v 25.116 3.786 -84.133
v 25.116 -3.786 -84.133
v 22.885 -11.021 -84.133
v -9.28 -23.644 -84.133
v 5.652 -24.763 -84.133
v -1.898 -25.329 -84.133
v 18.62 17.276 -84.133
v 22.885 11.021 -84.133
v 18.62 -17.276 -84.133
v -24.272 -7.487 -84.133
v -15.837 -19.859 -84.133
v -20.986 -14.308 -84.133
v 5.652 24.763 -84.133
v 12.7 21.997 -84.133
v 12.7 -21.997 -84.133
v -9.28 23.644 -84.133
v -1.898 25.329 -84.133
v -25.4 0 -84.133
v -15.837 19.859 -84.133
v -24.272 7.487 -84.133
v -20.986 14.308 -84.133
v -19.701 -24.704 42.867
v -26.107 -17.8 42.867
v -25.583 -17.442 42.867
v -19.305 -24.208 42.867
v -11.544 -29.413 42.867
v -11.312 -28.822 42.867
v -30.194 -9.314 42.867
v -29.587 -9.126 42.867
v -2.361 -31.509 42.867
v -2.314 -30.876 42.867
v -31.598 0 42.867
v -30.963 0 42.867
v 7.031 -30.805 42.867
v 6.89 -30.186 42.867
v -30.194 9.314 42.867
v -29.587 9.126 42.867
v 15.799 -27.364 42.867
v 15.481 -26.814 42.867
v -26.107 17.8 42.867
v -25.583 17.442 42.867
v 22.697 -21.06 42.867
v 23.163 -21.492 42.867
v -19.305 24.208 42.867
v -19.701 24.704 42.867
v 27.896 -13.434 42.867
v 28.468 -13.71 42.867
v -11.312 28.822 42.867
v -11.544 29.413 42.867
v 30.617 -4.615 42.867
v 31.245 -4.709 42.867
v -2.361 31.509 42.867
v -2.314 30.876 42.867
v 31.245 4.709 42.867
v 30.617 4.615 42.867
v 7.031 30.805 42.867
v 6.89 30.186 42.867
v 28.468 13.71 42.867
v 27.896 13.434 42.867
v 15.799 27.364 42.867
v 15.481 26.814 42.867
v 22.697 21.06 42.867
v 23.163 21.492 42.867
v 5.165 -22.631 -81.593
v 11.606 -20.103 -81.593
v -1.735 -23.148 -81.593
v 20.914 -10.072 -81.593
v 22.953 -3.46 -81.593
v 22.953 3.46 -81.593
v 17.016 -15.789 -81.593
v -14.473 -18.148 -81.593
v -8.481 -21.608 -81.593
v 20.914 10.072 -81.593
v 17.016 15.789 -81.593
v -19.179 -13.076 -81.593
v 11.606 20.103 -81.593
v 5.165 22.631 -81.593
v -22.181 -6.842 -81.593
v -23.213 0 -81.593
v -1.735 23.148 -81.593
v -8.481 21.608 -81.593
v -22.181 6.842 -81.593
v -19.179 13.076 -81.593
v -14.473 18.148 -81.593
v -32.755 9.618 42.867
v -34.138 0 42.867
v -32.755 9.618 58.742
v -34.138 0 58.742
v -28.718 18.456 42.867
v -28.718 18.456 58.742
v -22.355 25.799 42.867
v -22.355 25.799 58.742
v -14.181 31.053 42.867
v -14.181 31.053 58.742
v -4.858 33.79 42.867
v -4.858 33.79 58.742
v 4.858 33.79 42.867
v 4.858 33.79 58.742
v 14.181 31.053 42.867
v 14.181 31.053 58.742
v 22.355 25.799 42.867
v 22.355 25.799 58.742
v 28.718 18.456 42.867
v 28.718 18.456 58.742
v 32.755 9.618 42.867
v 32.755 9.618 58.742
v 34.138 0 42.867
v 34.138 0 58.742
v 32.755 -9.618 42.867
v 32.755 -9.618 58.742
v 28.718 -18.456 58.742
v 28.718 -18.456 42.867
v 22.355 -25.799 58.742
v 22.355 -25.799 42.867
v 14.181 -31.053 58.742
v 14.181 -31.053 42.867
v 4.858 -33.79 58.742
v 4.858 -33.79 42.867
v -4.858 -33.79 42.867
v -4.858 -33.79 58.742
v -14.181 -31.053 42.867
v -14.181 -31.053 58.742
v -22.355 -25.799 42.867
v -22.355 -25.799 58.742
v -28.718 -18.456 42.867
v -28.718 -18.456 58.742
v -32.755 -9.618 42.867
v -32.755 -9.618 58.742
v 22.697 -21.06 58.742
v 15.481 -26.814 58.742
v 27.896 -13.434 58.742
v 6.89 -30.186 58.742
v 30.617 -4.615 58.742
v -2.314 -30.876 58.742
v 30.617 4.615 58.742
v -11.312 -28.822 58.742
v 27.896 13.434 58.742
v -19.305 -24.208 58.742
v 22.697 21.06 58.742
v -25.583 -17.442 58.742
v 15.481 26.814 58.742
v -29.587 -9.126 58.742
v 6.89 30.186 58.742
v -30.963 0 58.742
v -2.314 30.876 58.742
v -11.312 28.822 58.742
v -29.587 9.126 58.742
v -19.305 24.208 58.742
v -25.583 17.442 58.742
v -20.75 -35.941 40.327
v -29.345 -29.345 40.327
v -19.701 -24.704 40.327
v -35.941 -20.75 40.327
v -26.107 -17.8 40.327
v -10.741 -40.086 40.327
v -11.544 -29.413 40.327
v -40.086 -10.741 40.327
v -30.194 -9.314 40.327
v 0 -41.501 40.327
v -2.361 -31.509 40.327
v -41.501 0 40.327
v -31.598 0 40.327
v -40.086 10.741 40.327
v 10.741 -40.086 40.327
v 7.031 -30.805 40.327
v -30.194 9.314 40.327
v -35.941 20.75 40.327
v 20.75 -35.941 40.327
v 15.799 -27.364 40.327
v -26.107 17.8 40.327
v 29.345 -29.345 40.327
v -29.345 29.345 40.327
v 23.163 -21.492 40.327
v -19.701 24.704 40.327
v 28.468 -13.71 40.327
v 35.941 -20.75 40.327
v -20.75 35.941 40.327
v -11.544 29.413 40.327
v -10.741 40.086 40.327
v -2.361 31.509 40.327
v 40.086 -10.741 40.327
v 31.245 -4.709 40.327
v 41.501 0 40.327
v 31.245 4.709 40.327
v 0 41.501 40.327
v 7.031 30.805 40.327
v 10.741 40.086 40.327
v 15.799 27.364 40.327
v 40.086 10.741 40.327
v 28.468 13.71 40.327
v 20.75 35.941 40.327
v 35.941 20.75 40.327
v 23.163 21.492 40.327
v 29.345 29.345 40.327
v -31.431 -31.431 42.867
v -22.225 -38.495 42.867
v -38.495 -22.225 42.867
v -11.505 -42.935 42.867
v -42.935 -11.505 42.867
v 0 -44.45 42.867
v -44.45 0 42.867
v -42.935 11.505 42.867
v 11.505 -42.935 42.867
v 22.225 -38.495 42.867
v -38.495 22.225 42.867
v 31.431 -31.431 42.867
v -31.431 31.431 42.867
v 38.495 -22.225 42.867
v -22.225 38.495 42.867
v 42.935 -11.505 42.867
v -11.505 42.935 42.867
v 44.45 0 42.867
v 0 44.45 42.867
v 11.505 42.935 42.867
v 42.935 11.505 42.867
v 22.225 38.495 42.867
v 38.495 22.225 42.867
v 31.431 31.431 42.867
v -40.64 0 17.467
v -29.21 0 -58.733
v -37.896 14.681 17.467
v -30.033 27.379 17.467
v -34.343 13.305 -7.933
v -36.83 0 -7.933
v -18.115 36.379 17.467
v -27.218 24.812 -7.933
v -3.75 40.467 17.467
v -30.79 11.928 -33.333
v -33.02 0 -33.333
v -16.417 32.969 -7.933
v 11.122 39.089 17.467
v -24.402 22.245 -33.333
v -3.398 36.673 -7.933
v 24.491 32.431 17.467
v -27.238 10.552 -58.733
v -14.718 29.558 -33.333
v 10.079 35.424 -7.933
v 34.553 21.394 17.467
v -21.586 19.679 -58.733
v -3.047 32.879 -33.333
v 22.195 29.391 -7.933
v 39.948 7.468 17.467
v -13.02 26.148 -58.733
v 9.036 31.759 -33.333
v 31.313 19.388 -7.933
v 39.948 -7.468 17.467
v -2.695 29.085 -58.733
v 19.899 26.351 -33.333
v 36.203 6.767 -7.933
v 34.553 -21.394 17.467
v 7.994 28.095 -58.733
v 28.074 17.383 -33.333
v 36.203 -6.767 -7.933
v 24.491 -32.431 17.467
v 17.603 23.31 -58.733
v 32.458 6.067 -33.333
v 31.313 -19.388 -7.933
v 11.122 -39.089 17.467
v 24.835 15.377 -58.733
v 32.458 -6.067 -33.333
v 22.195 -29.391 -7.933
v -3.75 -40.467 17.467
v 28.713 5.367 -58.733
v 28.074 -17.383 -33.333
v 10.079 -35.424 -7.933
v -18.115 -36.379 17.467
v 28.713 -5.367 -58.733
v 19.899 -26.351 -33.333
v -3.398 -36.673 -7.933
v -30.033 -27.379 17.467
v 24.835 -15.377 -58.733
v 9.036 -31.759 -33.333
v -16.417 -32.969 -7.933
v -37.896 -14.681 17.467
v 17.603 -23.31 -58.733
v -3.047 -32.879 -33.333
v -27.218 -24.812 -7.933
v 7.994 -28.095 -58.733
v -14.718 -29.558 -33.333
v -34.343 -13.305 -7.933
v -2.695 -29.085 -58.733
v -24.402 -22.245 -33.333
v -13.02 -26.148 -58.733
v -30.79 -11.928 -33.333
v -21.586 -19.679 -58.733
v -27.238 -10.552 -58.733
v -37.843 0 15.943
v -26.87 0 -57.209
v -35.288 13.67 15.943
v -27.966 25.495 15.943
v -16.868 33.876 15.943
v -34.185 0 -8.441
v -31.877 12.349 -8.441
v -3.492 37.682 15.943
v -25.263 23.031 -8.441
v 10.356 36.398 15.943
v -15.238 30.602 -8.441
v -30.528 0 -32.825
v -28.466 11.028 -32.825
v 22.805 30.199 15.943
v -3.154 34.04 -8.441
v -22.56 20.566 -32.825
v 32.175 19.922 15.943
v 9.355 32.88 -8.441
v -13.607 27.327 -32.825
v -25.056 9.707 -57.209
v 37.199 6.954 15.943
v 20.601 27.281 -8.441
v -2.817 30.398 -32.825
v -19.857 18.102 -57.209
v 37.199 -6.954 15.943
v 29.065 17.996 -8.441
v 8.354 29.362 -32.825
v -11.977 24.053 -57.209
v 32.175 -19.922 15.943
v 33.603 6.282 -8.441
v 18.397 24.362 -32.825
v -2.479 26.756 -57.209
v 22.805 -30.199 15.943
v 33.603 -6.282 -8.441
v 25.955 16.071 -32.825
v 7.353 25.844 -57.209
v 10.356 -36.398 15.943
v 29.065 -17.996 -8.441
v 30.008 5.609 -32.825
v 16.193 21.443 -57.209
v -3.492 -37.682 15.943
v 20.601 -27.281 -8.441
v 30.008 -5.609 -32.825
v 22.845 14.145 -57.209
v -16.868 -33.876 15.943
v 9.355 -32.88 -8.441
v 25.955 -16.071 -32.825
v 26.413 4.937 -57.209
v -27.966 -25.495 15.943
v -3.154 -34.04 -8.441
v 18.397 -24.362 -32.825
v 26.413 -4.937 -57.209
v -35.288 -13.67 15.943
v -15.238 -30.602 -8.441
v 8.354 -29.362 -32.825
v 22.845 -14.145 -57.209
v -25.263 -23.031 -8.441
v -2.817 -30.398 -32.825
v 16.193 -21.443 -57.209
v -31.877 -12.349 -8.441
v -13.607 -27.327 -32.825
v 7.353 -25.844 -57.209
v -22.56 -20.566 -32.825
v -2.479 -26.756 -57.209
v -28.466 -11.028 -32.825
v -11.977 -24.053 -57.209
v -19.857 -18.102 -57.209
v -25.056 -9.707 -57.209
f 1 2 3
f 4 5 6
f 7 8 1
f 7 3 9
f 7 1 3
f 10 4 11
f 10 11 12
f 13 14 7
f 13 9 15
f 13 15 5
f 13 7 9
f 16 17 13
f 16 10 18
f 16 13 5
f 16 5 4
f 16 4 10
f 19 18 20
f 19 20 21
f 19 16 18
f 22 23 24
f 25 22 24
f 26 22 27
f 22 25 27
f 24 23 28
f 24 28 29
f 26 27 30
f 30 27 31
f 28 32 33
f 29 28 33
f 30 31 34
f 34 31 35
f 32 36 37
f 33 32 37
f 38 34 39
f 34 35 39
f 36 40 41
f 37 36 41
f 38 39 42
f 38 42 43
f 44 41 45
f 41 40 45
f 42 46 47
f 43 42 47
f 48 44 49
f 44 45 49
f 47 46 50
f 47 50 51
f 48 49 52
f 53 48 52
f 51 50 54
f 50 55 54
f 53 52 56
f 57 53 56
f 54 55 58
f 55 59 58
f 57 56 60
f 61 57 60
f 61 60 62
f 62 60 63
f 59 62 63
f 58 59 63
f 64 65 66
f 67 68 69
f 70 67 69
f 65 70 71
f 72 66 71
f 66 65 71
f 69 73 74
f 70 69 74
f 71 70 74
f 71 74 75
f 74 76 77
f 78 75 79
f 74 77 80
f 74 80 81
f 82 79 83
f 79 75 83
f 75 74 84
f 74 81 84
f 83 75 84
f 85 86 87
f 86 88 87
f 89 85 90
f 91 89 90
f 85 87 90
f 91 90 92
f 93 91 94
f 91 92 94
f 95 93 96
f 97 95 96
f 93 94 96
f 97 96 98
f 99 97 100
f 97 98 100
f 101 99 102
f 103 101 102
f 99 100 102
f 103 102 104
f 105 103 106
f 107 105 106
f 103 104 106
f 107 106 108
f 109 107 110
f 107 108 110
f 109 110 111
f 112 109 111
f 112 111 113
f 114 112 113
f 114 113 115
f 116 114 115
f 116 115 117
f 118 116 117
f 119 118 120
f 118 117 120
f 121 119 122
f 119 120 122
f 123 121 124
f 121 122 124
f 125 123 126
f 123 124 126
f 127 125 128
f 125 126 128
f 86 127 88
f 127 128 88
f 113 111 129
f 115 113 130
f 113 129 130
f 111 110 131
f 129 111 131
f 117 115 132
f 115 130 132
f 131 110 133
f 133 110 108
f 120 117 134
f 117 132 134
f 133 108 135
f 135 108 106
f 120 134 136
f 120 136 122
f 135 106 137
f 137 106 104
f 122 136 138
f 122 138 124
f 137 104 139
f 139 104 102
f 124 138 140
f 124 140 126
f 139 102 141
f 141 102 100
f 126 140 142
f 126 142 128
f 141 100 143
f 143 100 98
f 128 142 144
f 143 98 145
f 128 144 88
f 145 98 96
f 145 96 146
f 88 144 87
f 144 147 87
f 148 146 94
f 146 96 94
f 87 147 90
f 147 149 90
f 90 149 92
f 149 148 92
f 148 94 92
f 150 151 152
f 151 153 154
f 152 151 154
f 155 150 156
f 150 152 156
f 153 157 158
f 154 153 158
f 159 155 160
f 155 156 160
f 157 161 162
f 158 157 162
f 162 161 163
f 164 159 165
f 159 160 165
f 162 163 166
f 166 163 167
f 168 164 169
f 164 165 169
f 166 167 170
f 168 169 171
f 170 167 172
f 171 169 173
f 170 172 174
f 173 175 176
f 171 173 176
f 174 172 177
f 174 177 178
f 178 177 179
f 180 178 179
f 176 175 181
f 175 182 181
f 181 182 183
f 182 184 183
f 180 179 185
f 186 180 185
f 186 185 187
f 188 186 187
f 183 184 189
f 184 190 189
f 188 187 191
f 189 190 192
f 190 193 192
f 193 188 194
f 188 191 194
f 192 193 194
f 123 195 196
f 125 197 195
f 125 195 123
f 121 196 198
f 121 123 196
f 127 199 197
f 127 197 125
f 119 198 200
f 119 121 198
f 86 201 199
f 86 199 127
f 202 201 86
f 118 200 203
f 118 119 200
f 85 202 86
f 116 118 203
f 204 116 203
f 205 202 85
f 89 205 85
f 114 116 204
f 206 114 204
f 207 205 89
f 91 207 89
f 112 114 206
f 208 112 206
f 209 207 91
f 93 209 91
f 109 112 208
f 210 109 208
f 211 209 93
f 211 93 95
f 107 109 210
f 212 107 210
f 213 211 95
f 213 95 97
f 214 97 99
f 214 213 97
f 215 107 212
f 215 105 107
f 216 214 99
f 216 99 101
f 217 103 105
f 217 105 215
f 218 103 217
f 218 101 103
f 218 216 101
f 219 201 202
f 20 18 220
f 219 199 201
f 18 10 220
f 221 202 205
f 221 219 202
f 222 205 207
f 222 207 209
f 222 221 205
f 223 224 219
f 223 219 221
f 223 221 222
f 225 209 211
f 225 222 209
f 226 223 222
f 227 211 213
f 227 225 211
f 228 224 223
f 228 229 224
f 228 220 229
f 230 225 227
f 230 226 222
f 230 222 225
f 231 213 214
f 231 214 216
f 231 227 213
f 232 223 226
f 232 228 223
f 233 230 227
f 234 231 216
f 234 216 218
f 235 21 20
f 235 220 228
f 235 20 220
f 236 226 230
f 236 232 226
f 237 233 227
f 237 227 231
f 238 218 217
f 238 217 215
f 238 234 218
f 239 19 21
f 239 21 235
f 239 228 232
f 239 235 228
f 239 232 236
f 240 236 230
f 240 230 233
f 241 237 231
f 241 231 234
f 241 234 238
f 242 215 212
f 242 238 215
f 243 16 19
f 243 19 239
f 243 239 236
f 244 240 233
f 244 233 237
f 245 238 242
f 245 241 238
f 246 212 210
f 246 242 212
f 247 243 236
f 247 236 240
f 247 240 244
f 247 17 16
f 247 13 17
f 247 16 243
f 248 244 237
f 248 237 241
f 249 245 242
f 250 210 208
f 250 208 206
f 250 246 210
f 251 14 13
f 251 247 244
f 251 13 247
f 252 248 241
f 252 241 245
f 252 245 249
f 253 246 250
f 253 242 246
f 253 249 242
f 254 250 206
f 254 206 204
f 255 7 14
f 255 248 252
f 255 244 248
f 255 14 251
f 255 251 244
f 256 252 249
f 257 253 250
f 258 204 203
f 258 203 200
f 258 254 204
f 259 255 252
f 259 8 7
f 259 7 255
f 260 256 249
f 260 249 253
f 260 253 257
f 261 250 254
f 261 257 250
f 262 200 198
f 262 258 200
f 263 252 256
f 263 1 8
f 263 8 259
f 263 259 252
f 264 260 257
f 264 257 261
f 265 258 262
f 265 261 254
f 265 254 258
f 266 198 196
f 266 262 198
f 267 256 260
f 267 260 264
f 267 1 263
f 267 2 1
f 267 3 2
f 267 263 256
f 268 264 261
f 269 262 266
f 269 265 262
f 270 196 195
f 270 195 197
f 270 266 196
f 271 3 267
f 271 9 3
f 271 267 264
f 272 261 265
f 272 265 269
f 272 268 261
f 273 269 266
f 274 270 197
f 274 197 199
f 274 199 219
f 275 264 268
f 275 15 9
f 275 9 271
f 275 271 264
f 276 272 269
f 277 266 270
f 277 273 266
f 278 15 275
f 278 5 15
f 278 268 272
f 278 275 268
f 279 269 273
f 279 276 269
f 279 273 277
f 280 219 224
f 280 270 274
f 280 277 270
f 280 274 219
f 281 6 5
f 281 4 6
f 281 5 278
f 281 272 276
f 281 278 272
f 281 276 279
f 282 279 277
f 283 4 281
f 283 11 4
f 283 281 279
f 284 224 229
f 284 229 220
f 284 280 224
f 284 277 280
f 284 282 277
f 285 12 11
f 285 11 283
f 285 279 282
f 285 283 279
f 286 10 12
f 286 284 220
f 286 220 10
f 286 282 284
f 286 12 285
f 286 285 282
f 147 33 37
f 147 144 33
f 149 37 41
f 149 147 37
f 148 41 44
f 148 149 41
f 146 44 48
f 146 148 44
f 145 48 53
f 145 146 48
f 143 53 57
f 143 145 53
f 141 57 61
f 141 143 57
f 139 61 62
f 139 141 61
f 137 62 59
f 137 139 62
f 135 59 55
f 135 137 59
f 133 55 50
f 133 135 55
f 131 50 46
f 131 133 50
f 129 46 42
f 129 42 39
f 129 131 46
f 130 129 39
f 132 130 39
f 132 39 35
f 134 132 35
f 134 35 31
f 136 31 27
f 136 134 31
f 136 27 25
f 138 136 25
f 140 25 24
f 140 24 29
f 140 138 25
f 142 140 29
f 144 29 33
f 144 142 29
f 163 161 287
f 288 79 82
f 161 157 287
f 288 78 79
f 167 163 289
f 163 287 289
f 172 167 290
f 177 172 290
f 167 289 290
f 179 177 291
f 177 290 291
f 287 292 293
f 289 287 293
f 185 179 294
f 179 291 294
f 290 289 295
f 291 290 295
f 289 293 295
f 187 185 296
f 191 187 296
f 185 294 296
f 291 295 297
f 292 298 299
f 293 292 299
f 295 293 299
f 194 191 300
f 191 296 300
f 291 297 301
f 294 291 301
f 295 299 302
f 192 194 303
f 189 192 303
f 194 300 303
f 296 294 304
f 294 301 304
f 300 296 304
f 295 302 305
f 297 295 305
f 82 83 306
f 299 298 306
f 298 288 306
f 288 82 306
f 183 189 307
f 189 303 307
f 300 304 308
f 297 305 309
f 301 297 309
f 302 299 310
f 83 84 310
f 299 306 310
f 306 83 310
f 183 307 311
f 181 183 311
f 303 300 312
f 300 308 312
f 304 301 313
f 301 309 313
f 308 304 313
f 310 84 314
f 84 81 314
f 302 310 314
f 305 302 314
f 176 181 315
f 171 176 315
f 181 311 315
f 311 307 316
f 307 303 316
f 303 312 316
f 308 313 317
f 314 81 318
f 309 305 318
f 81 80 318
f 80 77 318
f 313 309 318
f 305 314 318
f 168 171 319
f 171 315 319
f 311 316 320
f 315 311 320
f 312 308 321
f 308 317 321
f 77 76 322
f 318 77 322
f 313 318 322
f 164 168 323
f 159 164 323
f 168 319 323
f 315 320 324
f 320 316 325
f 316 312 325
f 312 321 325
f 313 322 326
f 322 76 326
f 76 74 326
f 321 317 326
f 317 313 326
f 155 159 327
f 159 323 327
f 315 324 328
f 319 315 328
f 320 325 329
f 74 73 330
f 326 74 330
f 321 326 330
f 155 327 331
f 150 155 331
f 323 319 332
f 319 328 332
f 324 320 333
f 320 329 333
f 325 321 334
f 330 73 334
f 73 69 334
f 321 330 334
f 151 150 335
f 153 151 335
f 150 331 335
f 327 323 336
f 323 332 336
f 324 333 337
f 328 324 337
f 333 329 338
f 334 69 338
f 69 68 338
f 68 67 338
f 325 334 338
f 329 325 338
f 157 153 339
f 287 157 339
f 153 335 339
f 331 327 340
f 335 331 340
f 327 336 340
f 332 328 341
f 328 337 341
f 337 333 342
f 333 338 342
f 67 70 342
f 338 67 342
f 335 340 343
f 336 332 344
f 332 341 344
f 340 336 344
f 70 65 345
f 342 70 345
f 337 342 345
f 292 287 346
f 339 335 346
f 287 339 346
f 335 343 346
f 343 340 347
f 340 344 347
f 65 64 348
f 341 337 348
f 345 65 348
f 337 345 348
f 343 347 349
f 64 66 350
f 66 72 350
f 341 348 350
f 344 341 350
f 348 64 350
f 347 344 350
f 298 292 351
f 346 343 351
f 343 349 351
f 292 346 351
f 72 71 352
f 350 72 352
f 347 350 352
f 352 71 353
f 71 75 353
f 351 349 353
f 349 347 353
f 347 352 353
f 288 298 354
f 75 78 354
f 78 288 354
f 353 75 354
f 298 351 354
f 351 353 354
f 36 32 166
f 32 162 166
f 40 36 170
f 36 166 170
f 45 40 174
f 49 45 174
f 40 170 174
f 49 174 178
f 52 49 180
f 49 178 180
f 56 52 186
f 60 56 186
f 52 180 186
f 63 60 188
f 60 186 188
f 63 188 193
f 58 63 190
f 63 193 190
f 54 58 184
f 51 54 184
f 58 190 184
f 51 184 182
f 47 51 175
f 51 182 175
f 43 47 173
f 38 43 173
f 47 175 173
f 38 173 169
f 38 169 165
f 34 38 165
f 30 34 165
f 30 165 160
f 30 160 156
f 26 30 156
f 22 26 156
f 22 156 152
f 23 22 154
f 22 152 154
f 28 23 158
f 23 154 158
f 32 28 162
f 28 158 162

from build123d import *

# Parameters (mm, degrees)
F0_W = 3.175
F0_H = 15.875
F2_T = 2.54


# Not quite as in the source:
# - a shell that OpenCascade refuses in one call is made with other operations: the cavity is built on its own and cut out


with BuildPart() as f1:
    # F0 (on Front) → F1 (revolve)
    with BuildSketch(Plane.XZ):
        Polygon((0, -84.1329338265), (0, 42.8670661735), (-30.9626, 42.8670661735), (-34.1376, 42.8670661735), (-44.45, 42.8670661735), (-25.4, -84.1329338265), align=None)
        with Locations((-32.5501, 50.8045661735)):
            Rectangle(F0_W, F0_H)
    revolve(axis=Axis((0, 0, -17.2506261634), (0, 0, -1)))

    # F2: shell of thickness 2.54, made by hand


with BuildPart() as f2_core1:
    # F2_t2: copy of F1
    add(f1.part)

    # the walls: a layer under each face that stays
    f2_faces = [f2_core1.faces().sort_by_distance(p)[0] for p in [
        (30.9626, 0, 50.8045661735),
        (-22.7584, -22.7584, 58.7420661735),
        (34.1376, 0, 50.8045661735),
        (-29.6333333333, -29.6333333333, 42.8670661735),
        (34.925, 0, -20.6329338265),
        (0, 0, -84.1329338265),
    ]]
    thicken(f2_faces, amount=-F2_T, mode=Mode.SUBTRACT)

    # F2_s3 → F2_t4 (revolve, cut)
    with BuildSketch(Plane.XZ):
        Polygon((-34.163, 42.8924661735), (-31.5976, 42.8670661735), (-31.5976, 40.3270661735), (-34.1376, 40.3270661735), align=None)
    revolve(axis=Axis((0, 0, 42.8670661735), (0, 0, -1)), mode=Mode.SUBTRACT)


with BuildPart() as f1_1:
    add(f1.part)

    # what is left inside the walls is the cavity
    f2_cavity = [f2_core1.part.solids().sort_by_distance(p)[0] for p in [
        (35.379465, 0, -0.309166),
    ]]
    add(f2_cavity, mode=Mode.SUBTRACT)


solid = f1_1.part
